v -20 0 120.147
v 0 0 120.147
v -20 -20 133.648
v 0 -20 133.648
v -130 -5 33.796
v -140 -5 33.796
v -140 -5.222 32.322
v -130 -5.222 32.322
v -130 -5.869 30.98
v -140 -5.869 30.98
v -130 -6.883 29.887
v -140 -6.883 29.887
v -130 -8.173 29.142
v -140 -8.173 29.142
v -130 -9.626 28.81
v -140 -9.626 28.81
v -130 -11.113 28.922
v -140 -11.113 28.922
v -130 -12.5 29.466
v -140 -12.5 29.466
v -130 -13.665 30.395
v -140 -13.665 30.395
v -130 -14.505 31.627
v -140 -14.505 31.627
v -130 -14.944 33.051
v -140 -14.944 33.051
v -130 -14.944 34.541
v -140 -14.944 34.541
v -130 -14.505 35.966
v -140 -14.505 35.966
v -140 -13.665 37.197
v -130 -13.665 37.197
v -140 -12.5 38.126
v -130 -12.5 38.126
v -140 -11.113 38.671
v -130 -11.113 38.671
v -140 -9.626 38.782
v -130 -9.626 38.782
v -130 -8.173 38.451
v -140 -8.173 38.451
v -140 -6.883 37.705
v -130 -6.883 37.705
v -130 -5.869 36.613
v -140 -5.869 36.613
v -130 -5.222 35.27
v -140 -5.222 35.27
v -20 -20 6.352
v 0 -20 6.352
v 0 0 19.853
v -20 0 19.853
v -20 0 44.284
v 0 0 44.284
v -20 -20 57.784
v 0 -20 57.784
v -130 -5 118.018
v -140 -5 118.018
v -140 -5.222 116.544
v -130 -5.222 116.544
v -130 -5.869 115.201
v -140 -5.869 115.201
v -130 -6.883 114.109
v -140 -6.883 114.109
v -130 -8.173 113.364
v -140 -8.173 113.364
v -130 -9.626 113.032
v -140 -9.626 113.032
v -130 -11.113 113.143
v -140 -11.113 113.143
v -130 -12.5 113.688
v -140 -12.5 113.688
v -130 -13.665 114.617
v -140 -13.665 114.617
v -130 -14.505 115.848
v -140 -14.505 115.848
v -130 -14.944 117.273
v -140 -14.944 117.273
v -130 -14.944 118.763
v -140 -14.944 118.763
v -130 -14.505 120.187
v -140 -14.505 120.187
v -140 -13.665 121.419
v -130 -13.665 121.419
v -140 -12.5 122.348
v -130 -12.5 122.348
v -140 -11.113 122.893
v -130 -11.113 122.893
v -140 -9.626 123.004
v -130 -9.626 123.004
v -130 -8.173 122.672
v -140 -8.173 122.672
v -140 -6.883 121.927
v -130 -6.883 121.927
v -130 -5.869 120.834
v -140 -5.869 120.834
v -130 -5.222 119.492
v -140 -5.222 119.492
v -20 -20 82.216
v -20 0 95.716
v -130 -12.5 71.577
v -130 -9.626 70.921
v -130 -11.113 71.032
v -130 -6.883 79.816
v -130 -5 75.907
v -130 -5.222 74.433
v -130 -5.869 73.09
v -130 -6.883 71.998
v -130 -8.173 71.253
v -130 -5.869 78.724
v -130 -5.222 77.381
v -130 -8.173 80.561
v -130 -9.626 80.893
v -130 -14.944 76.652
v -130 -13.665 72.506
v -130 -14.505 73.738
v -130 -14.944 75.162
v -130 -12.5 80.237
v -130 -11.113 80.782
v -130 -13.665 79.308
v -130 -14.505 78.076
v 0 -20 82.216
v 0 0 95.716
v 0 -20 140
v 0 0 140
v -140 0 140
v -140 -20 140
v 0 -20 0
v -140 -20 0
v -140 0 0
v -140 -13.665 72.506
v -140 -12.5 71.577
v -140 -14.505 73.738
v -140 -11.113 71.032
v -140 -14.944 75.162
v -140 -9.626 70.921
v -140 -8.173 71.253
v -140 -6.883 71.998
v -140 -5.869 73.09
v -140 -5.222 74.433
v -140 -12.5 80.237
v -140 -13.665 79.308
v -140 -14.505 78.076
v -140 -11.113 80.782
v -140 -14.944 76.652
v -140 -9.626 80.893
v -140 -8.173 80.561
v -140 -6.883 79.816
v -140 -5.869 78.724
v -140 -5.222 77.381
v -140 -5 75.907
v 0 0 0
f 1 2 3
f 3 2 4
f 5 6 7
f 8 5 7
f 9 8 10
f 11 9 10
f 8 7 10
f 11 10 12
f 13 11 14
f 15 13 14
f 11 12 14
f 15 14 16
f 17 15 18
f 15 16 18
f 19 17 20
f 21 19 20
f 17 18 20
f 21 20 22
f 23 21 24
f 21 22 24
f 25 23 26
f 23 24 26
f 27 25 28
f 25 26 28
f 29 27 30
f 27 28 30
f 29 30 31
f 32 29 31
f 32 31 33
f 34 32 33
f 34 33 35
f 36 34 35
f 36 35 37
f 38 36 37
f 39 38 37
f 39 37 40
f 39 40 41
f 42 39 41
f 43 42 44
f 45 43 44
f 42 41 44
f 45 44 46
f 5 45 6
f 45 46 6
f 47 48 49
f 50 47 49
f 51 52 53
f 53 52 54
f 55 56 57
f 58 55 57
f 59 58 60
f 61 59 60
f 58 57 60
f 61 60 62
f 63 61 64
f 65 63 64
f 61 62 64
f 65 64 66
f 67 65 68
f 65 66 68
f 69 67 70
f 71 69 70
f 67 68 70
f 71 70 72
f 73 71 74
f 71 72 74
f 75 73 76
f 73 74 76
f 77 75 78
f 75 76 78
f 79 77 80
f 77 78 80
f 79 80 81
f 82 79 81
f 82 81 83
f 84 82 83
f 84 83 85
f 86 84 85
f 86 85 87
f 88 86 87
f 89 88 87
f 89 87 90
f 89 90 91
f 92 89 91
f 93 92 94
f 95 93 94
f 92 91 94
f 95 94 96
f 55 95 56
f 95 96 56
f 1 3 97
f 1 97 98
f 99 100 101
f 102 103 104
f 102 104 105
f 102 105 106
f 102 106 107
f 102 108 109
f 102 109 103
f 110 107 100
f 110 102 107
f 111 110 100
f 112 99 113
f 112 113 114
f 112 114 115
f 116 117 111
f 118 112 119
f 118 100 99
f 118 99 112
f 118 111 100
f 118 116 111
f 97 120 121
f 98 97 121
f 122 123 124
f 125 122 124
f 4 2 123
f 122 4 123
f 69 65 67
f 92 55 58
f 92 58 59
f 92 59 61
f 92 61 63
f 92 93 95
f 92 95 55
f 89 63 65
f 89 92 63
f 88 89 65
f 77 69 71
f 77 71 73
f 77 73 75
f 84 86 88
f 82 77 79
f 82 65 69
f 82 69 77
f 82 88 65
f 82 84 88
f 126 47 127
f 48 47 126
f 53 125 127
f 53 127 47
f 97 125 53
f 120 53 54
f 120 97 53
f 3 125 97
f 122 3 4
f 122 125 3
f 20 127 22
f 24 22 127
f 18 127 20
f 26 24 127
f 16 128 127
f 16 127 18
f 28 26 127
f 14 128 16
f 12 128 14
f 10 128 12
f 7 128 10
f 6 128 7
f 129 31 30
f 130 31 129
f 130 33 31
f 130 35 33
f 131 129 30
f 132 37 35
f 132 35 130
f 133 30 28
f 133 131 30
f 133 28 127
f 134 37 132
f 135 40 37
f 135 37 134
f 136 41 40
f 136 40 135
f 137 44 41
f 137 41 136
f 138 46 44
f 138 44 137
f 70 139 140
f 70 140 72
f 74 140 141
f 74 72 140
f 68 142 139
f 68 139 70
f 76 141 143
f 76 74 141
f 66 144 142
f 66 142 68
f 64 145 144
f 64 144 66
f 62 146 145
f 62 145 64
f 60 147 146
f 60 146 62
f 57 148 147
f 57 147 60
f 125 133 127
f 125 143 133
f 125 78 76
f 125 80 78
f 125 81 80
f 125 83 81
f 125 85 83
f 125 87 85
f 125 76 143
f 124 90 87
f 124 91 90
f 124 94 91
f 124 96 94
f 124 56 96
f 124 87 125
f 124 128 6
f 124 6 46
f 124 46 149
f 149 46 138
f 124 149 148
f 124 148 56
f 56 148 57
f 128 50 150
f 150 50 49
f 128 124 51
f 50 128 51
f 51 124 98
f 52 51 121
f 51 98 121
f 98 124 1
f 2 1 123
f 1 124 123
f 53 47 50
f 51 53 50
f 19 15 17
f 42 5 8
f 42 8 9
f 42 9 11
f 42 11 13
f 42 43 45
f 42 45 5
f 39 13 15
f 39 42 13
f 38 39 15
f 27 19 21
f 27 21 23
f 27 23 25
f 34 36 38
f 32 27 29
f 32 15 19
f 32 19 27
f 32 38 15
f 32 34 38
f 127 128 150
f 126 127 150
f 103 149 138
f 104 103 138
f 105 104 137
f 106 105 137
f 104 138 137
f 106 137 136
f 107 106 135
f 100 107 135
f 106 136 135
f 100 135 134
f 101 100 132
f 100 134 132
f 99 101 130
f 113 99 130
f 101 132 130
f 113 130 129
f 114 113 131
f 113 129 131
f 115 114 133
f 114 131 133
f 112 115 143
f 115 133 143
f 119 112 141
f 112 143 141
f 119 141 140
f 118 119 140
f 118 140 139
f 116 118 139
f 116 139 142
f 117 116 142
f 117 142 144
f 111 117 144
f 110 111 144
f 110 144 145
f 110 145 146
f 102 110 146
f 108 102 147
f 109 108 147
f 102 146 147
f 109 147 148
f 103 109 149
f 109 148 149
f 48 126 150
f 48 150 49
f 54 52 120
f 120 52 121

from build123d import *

# Parameters (mm, degrees)
F0_W     = 120
F0_H     = 140
F0_W_2   = 20
F1_DEPTH = 20
F3_DEPTH = 20
F5_DEPTH = 10


# Not quite as in the source:
# - ends of sketch curves that miss each other by under 0.0002 mm in the source are joined


with BuildPart() as f1:
    # F0 (on Front) → F1 (new body)
    with BuildSketch(Plane.XZ):
        with Locations((-60, 70)):
            Rectangle(F0_W, F0_H)
        with Locations((-130, 70)):
            Rectangle(F0_W_2, F0_H)
    extrude(amount=F1_DEPTH)

    # F2 (on face) → F3 (cut)
    with BuildSketch(Plane.YZ):
        Polygon((-20, 133.6477049324), (-20, 82.2157338262), (0, 95.7159893793), (0, 120.1474493793), align=None)
        Polygon((0, 44.2840144469), (-20, 57.78427), (-20, 6.3522950676), (0, 19.8525506207), align=None)
    extrude(amount=-F3_DEPTH, mode=Mode.SUBTRACT)

    # F4 (on face) → F5 (cut)
    with BuildSketch(Plane(origin=(-140, 0, 0), x_dir=(0, -1, 0), z_dir=(-1, 0, 0))):
        with BuildLine():
            ThreePointArc((15, 75.9070515633), (10, 80.9070515633), (5, 75.9070515633))
            Line((5, 75.9070515633), (15, 75.9070515633))
        make_face()
        with BuildLine():
            Line((15, 75.9070515633), (5, 75.9070515633))
            ThreePointArc((5, 75.9070515633), (10, 70.9070515633), (15, 75.9070515633))
        make_face()
        with BuildLine():
            ThreePointArc((15, 33.7962135673), (10, 38.7962135673), (5, 33.7962135673))
            Line((5, 33.7962135673), (15, 33.7962135673))
        make_face()
        with BuildLine():
            Line((15, 33.7962135673), (5, 33.7962135673))
            ThreePointArc((5, 33.7962135673), (10, 28.7962135673), (15, 33.7962135673))
        make_face()
        with BuildLine():
            ThreePointArc((15, 118.0178895593), (10, 123.0178895593), (5, 118.0178895593))
            Line((5, 118.0178895593), (15, 118.0178895593))
        make_face()
        with BuildLine():
            Line((15, 118.0178895593), (5, 118.0178895593))
            ThreePointArc((5, 118.0178895593), (10, 113.0178895593), (15, 118.0178895593))
        make_face()
    extrude(amount=-F5_DEPTH, mode=Mode.SUBTRACT)


solid = f1.part
